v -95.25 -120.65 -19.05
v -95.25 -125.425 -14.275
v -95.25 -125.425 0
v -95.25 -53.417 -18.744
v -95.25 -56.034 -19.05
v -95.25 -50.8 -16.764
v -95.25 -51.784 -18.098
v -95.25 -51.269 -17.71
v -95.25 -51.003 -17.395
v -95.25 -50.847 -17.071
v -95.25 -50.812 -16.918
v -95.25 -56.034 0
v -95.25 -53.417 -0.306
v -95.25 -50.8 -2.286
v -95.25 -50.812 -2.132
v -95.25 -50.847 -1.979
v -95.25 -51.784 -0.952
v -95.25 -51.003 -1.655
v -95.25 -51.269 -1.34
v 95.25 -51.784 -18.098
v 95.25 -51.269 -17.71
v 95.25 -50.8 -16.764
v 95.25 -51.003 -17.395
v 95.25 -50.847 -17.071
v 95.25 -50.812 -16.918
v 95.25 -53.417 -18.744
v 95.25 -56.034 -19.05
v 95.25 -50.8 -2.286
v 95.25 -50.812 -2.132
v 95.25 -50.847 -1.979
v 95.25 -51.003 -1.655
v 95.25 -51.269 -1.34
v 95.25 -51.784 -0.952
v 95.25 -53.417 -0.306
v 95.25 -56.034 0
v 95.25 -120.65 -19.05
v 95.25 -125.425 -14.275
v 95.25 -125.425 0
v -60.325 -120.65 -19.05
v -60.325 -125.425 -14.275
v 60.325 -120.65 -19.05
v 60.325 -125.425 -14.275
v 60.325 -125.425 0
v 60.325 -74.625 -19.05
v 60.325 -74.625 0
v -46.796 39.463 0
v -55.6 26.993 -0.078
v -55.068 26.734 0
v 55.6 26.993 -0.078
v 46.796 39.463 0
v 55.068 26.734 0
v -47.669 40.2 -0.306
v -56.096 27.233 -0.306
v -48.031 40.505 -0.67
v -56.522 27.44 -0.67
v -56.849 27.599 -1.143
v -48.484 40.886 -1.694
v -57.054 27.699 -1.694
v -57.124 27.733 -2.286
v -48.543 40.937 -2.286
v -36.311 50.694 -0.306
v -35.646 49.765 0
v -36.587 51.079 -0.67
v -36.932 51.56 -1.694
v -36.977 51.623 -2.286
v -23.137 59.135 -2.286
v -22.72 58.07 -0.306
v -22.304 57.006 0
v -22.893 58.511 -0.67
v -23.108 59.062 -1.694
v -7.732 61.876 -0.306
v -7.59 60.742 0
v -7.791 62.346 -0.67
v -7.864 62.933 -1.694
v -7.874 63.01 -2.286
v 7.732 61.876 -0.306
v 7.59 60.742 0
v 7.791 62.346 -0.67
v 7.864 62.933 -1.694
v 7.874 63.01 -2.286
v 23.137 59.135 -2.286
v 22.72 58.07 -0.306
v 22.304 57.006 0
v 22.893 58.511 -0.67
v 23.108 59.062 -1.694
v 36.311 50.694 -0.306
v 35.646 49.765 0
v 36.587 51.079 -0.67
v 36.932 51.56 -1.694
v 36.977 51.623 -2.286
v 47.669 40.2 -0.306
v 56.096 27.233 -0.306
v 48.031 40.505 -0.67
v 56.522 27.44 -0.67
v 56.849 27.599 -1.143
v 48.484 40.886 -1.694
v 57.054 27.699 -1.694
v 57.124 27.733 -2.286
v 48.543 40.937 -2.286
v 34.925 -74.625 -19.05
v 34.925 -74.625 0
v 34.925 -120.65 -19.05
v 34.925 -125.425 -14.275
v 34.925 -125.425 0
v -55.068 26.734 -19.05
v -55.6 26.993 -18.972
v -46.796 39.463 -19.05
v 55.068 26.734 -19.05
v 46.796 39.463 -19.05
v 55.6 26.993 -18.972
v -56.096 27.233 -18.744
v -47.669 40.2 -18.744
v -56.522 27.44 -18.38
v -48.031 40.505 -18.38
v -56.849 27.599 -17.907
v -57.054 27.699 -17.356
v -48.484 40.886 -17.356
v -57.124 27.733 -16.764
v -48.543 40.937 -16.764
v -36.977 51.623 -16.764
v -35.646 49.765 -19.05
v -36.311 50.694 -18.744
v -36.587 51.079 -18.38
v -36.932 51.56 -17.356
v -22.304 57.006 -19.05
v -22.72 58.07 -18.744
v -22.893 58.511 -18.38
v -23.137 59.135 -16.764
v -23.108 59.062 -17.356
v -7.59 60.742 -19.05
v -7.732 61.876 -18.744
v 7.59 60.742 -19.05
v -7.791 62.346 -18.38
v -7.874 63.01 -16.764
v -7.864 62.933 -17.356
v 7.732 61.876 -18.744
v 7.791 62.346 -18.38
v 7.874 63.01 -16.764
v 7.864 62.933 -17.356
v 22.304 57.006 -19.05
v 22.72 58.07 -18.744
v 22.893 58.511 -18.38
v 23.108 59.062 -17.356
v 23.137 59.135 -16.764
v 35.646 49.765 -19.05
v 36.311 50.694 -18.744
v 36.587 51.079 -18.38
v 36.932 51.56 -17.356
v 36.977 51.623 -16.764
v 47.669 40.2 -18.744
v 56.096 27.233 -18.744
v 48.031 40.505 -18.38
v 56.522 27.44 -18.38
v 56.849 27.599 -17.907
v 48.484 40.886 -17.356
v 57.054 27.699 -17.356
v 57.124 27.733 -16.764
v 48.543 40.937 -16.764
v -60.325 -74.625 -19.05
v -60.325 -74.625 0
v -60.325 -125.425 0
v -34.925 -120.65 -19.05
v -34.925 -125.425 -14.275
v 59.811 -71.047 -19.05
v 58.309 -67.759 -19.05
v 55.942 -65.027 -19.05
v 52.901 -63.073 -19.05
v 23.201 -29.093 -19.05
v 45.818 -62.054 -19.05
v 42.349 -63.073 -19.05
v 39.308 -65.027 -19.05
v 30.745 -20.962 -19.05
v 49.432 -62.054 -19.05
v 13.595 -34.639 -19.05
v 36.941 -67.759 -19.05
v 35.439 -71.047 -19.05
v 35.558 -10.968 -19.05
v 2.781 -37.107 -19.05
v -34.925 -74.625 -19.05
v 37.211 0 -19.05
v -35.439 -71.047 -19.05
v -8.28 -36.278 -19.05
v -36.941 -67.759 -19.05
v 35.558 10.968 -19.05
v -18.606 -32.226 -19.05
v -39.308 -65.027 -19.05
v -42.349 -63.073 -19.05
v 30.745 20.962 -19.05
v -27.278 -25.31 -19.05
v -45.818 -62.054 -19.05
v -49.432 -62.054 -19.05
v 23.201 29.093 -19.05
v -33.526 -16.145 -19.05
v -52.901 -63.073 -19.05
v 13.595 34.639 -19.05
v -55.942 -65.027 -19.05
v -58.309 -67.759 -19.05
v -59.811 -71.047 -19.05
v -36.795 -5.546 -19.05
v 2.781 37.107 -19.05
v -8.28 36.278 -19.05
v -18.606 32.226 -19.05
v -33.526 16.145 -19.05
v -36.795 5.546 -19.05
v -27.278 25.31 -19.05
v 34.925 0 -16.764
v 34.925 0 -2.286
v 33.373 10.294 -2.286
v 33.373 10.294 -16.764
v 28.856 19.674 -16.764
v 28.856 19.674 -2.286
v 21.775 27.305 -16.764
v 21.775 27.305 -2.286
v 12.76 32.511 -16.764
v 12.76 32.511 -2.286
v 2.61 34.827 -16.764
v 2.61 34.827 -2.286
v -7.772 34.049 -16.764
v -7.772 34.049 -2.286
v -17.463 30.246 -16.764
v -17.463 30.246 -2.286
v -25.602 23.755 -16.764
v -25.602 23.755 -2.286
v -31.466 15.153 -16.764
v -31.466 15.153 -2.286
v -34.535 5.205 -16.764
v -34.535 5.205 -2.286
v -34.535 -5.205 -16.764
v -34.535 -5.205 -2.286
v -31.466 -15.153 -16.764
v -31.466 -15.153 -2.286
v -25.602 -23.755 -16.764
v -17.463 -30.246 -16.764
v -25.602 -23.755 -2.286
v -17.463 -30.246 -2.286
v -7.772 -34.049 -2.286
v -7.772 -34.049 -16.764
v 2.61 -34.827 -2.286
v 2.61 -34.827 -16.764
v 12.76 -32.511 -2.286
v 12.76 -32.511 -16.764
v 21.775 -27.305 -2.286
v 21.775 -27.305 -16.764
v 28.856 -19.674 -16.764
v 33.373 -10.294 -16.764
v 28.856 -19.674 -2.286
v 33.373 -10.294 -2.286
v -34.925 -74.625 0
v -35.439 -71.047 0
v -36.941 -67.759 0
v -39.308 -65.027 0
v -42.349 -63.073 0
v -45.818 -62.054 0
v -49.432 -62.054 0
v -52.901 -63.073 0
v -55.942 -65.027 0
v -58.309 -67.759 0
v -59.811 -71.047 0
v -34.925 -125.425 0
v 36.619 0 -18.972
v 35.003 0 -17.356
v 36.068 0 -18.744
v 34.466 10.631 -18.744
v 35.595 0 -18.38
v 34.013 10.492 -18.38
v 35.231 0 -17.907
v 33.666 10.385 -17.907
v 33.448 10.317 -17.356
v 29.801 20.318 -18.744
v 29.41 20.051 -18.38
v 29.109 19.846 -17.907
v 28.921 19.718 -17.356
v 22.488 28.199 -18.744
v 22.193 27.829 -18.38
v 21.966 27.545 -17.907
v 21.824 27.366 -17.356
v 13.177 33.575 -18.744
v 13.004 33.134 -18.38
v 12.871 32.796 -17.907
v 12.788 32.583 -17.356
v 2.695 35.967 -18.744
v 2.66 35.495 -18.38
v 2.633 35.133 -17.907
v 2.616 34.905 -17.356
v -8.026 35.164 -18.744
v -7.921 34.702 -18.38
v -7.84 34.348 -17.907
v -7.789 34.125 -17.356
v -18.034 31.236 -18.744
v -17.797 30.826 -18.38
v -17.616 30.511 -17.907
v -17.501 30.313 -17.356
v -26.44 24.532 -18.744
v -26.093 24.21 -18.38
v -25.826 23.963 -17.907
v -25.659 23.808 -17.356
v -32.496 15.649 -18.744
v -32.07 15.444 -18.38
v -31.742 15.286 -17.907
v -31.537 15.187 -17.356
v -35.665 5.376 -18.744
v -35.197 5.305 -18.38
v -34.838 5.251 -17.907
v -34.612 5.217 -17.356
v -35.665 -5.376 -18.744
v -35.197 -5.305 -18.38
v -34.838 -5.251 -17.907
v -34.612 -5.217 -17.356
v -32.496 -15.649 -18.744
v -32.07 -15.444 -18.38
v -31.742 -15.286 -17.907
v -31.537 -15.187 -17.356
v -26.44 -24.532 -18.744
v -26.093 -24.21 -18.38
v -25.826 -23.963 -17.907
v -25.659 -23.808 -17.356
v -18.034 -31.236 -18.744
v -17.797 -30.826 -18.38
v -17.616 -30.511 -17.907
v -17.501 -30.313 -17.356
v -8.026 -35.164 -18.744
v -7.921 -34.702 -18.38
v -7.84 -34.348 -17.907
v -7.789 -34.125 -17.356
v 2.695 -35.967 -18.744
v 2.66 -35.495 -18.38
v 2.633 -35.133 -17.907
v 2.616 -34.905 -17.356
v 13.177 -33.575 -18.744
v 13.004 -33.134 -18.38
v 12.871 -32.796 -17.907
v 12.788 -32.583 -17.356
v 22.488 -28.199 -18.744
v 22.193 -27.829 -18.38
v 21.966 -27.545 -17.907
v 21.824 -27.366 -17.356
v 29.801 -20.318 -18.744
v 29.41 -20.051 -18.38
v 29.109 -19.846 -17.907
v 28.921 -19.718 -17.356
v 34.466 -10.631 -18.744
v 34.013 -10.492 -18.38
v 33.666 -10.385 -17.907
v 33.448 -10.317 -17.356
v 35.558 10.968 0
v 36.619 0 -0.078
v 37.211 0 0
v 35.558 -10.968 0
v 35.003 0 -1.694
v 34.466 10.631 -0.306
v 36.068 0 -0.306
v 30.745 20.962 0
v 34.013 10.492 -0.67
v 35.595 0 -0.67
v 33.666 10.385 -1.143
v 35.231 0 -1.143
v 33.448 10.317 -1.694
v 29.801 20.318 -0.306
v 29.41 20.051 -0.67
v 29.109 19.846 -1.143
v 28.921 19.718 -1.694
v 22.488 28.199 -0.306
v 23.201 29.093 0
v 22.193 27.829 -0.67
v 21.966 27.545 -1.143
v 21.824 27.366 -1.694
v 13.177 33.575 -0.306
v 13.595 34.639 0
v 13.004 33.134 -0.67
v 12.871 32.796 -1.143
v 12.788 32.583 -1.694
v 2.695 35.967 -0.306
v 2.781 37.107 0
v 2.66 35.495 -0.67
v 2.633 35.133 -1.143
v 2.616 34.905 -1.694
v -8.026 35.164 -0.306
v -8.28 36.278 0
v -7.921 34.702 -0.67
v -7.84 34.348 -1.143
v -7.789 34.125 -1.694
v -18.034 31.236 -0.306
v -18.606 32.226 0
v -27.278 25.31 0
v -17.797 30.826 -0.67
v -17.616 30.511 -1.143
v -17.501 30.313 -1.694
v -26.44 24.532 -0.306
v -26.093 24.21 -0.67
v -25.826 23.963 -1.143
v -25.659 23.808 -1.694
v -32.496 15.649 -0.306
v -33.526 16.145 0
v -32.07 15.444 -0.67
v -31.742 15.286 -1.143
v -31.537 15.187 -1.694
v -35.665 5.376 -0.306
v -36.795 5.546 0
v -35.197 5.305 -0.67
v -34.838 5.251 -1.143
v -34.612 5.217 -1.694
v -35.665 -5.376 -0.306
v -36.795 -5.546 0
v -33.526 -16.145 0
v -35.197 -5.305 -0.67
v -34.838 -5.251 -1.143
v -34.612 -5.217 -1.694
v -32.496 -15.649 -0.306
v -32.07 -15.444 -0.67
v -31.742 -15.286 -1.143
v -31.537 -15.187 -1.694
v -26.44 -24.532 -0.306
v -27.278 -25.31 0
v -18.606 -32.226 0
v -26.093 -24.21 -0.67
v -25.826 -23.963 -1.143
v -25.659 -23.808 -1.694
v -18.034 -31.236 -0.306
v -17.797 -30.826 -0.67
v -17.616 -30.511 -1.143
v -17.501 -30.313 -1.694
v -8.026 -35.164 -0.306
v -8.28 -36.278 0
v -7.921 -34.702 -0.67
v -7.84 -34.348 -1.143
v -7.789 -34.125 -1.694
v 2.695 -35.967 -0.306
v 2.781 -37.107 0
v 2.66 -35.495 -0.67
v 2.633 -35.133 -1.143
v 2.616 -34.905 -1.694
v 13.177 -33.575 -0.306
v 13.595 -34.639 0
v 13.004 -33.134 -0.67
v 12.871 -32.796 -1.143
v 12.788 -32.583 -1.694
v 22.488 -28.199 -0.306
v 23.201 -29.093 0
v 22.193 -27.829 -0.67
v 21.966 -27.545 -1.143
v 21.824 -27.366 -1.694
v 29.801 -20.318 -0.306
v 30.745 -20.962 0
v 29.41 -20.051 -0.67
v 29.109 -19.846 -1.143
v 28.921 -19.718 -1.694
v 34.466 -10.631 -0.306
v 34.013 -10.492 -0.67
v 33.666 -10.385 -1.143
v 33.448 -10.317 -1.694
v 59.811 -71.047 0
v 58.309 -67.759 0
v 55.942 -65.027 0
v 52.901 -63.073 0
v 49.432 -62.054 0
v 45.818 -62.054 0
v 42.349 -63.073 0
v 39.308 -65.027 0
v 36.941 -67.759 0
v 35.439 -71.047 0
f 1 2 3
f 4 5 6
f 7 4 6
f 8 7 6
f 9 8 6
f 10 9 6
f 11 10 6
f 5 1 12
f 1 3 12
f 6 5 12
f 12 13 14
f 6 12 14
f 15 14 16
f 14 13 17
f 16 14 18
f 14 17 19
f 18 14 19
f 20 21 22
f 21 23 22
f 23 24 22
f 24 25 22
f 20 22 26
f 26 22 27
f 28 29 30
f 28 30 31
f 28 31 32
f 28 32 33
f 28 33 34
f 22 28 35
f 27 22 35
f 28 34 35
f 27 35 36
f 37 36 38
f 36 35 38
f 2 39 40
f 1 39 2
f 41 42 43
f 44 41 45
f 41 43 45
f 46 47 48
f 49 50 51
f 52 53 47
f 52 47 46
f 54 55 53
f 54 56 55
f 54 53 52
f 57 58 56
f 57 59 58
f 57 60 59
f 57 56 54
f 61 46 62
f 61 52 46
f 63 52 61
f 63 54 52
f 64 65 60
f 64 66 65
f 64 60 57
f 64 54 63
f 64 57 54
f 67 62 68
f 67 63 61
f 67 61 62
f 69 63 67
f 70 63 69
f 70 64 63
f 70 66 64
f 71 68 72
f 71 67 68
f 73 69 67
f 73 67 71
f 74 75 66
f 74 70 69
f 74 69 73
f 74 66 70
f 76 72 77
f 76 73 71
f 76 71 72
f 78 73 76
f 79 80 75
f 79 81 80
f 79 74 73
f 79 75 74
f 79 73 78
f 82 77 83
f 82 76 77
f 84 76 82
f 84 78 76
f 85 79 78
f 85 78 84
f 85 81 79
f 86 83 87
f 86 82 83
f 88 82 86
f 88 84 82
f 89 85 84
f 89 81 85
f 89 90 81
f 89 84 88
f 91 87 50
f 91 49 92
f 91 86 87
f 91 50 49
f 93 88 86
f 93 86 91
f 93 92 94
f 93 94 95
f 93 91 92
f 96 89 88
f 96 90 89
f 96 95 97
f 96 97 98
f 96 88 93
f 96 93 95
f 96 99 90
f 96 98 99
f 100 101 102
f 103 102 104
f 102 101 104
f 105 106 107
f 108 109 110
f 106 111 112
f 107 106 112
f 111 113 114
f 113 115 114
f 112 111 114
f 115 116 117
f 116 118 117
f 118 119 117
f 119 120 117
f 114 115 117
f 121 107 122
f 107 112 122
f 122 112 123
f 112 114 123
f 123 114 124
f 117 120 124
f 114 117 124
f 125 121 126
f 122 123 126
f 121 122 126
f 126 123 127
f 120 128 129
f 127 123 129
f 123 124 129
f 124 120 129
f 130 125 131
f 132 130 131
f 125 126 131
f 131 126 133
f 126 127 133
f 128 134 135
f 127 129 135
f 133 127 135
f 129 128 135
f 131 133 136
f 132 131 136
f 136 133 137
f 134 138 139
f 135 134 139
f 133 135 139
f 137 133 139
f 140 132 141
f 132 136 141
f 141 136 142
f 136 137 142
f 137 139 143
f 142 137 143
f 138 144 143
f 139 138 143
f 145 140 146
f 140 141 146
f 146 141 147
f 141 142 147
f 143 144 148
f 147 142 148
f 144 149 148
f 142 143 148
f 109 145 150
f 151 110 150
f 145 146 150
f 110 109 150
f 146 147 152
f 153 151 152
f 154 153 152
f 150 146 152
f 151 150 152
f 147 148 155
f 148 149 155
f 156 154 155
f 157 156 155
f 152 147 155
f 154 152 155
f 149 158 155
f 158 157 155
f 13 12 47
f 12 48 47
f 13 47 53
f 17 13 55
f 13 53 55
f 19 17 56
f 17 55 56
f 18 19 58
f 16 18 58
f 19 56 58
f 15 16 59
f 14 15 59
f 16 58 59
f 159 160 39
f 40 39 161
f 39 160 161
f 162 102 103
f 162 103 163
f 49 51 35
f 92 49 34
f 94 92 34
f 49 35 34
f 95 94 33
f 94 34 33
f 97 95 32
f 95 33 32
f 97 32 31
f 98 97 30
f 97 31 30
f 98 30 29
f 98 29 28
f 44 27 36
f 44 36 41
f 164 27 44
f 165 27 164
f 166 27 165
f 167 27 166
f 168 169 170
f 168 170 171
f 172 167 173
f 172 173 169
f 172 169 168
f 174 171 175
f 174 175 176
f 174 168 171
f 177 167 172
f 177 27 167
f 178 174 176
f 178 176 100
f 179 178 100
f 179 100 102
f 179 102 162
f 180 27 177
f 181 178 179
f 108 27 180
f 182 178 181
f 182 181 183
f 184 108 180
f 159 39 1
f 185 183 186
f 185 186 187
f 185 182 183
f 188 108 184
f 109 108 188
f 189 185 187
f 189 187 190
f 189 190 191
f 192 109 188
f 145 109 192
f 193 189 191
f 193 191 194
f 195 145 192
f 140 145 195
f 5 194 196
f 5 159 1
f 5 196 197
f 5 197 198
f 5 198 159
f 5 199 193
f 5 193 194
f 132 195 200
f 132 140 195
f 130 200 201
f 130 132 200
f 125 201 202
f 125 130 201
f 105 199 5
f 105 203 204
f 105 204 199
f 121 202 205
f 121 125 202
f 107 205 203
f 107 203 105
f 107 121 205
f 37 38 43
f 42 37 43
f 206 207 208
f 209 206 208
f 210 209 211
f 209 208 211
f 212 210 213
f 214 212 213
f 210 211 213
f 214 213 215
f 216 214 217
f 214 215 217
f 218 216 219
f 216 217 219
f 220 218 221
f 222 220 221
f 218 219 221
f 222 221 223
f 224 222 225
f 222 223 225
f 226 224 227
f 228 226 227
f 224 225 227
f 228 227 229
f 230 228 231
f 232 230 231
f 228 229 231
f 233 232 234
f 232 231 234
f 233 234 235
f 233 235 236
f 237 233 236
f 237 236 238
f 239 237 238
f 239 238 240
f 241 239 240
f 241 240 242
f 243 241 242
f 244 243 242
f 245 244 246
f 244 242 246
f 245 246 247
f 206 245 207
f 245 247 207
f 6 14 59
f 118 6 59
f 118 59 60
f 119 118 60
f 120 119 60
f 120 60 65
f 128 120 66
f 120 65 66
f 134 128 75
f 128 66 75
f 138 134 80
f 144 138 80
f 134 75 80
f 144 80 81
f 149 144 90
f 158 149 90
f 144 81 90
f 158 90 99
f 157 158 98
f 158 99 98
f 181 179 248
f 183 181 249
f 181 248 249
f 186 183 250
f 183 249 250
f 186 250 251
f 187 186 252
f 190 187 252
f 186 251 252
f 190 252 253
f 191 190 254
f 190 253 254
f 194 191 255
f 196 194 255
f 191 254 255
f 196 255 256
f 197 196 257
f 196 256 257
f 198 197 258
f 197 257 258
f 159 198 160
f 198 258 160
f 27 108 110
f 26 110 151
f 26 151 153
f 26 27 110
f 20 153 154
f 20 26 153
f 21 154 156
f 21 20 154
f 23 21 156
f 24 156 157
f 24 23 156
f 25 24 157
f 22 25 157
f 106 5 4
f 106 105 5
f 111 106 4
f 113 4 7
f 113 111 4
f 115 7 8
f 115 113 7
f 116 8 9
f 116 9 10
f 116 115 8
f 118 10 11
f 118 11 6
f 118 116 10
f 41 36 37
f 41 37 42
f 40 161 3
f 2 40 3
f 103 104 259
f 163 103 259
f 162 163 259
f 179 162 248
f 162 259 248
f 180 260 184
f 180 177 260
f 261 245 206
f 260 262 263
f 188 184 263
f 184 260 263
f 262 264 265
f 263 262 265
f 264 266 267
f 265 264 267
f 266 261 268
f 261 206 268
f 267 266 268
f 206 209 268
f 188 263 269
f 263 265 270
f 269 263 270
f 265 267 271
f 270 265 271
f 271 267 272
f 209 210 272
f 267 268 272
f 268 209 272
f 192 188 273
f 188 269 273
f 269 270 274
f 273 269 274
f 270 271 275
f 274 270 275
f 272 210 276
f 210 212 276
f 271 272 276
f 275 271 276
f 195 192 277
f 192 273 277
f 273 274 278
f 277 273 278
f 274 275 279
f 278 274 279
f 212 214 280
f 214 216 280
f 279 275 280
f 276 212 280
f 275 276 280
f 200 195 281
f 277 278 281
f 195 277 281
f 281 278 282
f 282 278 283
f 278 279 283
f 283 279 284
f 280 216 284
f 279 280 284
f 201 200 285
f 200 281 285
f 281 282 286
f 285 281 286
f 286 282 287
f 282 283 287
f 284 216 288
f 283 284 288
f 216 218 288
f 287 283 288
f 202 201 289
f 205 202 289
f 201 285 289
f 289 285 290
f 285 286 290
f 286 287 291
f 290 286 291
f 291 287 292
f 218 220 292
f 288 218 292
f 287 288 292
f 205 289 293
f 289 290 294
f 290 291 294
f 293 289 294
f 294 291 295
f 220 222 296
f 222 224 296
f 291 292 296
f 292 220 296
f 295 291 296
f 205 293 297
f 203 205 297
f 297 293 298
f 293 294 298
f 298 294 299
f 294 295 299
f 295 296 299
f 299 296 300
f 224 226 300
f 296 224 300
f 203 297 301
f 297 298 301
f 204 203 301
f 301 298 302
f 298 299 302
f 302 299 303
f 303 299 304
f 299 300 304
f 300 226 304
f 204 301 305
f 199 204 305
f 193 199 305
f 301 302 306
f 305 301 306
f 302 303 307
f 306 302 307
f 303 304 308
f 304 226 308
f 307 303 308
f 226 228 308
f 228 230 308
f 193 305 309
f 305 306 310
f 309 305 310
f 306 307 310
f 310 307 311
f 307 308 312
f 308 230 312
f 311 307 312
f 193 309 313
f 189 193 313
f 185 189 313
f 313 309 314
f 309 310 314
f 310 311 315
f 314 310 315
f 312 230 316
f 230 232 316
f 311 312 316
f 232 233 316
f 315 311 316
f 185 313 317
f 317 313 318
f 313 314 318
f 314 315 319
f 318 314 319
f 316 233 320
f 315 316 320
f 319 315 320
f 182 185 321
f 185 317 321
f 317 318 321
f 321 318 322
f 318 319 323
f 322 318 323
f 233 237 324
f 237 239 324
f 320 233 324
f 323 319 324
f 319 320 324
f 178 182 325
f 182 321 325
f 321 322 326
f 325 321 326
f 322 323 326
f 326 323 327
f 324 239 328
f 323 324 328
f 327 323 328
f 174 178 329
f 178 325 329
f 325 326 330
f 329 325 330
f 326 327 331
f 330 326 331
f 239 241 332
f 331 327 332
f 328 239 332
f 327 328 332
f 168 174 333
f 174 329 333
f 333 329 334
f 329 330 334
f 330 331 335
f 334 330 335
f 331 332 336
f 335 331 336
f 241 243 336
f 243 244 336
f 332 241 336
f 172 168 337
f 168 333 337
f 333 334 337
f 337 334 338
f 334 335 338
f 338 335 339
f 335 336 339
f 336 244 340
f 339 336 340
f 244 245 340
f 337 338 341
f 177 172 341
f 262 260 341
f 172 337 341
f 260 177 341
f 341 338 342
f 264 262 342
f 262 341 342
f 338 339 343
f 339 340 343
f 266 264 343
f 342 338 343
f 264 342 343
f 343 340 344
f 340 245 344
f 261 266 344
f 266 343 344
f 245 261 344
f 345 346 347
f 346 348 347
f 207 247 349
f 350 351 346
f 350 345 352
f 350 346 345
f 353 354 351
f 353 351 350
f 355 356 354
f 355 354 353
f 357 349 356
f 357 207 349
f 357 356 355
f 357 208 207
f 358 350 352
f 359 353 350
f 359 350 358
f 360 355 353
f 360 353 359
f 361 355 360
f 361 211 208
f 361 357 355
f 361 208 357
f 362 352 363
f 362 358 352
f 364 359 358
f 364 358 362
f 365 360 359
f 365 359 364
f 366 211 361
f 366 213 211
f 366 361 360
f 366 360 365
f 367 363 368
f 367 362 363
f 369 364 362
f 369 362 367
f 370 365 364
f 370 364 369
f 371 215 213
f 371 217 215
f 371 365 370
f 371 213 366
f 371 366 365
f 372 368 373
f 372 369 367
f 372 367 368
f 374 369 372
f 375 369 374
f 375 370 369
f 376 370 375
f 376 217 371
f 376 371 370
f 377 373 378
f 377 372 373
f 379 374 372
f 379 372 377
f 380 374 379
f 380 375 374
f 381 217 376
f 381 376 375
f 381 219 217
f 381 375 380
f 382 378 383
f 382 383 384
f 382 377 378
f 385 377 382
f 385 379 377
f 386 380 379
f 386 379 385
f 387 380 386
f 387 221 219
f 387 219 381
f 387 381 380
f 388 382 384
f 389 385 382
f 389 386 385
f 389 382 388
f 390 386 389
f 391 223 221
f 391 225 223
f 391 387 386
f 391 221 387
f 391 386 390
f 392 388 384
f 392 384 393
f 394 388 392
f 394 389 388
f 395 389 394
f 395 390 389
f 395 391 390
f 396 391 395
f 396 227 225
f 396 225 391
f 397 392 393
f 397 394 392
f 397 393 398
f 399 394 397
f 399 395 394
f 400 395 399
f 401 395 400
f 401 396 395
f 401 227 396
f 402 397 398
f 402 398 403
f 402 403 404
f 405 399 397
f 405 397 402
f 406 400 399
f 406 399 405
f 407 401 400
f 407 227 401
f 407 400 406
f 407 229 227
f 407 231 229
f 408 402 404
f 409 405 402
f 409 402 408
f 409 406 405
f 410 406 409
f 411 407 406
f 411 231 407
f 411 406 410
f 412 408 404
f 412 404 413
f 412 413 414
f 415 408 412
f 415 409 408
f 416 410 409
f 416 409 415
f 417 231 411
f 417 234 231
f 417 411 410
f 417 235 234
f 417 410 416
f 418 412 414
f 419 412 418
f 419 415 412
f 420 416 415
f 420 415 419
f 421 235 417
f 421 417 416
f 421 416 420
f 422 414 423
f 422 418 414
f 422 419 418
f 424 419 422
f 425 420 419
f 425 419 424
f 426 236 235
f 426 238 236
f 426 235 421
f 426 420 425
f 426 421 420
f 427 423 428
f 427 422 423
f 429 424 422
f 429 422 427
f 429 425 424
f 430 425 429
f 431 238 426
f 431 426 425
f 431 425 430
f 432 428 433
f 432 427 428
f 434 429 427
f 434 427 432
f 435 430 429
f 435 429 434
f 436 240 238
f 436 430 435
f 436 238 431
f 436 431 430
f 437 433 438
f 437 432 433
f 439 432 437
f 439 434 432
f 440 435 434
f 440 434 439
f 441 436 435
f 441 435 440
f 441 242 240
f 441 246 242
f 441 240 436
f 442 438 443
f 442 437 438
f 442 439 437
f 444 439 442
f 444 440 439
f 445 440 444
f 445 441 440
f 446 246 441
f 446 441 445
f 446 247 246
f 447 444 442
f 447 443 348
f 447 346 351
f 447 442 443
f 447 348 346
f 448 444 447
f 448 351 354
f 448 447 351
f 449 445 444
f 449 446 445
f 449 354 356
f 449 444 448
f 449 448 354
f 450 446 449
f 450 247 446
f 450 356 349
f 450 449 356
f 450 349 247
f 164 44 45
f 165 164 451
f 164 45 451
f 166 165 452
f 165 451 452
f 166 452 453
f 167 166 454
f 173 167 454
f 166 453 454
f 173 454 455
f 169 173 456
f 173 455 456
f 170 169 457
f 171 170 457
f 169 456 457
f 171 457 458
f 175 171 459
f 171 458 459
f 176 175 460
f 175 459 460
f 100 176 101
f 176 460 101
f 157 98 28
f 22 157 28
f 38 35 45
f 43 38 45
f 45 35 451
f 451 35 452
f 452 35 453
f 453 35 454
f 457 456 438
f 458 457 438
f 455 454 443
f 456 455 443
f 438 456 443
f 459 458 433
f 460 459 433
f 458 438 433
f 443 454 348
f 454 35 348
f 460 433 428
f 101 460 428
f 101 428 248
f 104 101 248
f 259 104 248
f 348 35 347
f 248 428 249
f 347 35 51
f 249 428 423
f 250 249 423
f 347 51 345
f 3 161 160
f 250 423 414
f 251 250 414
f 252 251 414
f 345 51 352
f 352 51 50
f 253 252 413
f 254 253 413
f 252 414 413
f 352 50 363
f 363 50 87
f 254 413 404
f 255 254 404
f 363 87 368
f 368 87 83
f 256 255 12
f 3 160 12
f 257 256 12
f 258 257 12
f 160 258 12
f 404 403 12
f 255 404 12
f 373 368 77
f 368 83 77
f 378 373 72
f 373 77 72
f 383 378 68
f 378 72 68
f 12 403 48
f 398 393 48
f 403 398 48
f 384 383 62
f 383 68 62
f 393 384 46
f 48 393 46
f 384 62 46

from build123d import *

# Parameters (mm, degrees)
SKETCH1_R      = 34.925
EXTRUDE1_DEPTH = 19.05
CHAMFER3_SIZE  = 4.7752
FILLET1_R      = 2.286


with BuildPart() as part:
    # Sketch1 → Extrude1 (new body)
    with BuildSketch(Plane.XY):
        with BuildLine():
            Line((-60.325, -74.6252), (-60.325, -125.4252))
            Line((-60.325, -125.4252), (-95.25, -125.4252))
            Line((-95.25, -125.4252), (-95.25, -50.8))
            Line((-95.25, -50.8), (-57.124032384, 27.732560721))
            ThreePointArc((-57.124032384, 27.732560721), (0, 63.5), (57.124032384, 27.732560721))
            Line((57.124032384, 27.732560721), (95.25, -50.8))
            Line((95.25, -50.8), (95.25, -125.4252))
            Line((95.25, -125.4252), (60.325, -125.4252))
            Line((60.325, -125.4252), (60.325, -74.6252))
            ThreePointArc((60.325, -74.6252), (47.625, -61.9252), (34.925, -74.6252))
            Line((34.925, -74.6252), (34.925, -125.4252))
            Line((34.925, -125.4252), (-34.925, -125.4252))
            Line((-34.925, -125.4252), (-34.925, -74.6252))
            ThreePointArc((-34.925, -74.6252), (-47.625, -61.9252), (-60.325, -74.6252))
        make_face()
        Circle(SKETCH1_R, mode=Mode.SUBTRACT)
    extrude(amount=-EXTRUDE1_DEPTH)

    # Chamfer3
    chamfer3_edges = [part.edges().sort_by_distance(p)[0] for p in [
        (0, -125.4252, -19.05),
        (77.7875, -125.4252, -19.05),
        (-77.7875, -125.4252, -19.05),
    ]]
    chamfer(chamfer3_edges, length=CHAMFER3_SIZE)

    # Fillet1
    fillet1_edges = [part.edges().sort_by_distance(p)[0] for p in [
        (-76.187016192, -11.53371964, 0),
        (0, 63.5, 0),
        (76.187016192, -11.53371964, 0),
        (76.187016192, -11.53371964, -19.05),
        (0, 63.5, -19.05),
        (-34.925, 0, -19.05),
        (-34.925, 0, 0),
        (-76.187016192, -11.53371964, -19.05),
    ]]
    fillet(fillet1_edges, radius=FILLET1_R)


solid = part.part
